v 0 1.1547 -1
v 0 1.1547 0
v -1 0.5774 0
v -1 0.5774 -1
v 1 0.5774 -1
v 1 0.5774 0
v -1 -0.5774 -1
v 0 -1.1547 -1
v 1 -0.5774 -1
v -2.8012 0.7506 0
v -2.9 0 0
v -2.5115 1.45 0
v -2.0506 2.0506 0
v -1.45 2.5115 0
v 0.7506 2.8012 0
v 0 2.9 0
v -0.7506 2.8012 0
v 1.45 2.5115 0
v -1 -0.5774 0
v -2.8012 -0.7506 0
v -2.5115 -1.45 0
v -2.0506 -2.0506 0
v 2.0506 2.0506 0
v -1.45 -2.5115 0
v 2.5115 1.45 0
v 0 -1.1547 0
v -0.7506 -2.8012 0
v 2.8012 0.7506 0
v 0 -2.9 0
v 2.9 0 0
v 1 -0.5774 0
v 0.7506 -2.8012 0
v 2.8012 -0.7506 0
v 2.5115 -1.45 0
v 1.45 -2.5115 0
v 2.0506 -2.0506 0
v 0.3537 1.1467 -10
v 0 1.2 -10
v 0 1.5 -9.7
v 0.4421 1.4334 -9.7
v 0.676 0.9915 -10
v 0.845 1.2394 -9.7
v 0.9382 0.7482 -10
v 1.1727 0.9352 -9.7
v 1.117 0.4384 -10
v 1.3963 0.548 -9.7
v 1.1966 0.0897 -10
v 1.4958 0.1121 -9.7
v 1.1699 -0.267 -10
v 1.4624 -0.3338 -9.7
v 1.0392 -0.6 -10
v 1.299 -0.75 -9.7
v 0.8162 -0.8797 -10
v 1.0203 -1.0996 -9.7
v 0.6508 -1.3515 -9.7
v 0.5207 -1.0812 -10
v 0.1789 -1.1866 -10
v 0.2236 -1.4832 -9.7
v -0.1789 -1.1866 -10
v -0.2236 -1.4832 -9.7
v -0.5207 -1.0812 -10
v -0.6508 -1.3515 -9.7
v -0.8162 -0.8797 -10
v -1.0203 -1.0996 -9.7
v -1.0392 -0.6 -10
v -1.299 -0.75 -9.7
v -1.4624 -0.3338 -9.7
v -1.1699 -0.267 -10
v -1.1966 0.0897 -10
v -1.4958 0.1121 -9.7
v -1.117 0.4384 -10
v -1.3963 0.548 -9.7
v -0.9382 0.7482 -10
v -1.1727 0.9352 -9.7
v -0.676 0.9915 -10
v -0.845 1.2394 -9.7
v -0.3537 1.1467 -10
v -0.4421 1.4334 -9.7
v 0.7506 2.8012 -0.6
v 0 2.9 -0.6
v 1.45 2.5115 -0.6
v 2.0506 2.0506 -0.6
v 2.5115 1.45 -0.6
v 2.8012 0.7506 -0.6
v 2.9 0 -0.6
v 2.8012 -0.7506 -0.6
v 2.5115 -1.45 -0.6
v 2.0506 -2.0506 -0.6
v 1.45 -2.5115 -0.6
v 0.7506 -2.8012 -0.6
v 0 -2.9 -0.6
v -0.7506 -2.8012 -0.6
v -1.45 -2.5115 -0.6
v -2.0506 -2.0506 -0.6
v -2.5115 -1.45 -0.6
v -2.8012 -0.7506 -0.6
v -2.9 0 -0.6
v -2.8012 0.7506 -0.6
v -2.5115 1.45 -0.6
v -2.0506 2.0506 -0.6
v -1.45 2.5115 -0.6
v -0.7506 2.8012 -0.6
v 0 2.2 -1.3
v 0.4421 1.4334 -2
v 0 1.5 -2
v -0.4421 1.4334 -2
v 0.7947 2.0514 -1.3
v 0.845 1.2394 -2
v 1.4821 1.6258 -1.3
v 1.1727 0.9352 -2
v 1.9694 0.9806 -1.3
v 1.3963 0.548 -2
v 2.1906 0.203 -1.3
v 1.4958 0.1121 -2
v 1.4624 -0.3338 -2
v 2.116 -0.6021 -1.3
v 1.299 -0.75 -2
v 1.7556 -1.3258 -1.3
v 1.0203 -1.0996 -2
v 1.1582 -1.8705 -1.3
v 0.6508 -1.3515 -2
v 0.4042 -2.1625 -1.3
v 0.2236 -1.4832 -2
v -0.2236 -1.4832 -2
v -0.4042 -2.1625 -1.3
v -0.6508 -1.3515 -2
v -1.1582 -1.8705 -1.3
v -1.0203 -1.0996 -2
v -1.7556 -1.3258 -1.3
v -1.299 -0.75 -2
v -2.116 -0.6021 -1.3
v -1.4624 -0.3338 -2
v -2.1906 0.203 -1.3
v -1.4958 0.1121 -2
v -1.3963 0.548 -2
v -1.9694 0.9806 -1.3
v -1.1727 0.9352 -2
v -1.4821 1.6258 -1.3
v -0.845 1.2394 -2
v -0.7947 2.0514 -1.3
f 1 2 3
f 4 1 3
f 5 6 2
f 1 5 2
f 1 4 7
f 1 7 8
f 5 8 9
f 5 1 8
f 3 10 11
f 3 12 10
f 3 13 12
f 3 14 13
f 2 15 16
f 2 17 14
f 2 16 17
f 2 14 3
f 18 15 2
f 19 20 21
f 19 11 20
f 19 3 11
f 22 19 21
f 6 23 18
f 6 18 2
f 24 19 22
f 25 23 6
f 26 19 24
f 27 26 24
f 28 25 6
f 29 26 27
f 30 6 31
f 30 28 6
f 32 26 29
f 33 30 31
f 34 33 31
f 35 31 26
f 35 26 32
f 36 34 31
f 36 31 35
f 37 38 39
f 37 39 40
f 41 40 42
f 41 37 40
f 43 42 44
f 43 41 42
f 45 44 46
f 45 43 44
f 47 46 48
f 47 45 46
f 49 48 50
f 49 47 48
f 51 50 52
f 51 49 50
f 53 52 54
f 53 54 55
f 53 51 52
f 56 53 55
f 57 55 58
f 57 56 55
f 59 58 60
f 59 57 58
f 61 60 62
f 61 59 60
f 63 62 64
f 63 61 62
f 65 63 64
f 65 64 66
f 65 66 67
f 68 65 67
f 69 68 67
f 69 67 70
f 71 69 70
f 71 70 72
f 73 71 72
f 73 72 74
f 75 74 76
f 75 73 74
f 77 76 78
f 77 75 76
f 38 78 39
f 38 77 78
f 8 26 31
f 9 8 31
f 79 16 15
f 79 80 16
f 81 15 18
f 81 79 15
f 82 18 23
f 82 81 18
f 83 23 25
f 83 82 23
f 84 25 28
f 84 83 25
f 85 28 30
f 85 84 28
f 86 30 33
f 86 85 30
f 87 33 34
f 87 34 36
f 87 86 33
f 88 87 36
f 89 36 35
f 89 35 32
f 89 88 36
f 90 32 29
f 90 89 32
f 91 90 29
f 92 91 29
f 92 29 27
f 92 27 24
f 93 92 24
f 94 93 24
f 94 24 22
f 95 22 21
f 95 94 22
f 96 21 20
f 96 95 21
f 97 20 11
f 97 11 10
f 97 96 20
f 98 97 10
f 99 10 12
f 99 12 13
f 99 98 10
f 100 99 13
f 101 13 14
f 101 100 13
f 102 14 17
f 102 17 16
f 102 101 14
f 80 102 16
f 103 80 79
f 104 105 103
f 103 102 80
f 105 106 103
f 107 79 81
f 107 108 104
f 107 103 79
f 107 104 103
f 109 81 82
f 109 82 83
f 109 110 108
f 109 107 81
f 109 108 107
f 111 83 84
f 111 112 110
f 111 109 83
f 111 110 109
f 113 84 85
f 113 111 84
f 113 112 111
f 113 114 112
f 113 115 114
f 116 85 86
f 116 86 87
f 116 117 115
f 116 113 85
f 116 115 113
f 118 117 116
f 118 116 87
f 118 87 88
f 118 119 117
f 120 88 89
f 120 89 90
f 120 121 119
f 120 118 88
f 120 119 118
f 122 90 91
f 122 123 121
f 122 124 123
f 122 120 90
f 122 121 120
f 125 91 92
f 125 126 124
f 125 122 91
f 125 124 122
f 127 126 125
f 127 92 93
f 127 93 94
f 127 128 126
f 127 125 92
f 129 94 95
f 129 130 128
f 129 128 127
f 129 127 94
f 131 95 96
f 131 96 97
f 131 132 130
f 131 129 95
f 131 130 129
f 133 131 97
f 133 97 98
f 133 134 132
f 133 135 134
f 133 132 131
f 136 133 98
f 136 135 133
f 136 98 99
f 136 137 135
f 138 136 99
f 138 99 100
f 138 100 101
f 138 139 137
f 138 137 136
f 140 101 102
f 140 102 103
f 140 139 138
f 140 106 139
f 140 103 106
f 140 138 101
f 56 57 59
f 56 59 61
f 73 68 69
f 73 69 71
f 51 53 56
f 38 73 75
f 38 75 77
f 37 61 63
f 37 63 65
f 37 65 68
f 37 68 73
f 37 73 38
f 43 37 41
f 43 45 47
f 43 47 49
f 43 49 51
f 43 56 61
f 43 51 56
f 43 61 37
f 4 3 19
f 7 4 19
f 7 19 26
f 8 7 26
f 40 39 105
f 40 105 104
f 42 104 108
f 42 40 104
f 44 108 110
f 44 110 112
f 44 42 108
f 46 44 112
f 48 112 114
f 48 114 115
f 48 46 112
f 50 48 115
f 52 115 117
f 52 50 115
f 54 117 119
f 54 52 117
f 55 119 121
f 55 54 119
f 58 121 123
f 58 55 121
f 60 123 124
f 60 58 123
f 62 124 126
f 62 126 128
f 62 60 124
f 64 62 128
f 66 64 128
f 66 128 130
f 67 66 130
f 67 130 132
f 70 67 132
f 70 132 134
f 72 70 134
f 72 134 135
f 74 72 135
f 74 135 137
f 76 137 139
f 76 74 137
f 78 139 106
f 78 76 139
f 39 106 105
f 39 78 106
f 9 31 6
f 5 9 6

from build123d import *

# Parameters (mm, degrees)
SCHNITT_LINEAR_AUSTRAGEN1_DEPTH = 1
FASE1_SIZE                      = 0.3


with BuildPart() as part:
    # Skizze1 → Rotation1 (revolve)
    with BuildSketch(Plane(origin=(0, 0, 0), x_dir=(0, 0, -1), z_dir=(1, 0, 0))):
        Polygon((0, 0), (0, 2.9), (0.6, 2.9), (2, 1.5), (10, 1.5), (10, 0), align=None)
    revolve(axis=Axis((0, 0, 31.763581507), (0, 0, -1)))

    # Skizze3 → Schnitt-Linear austragen1 (cut)
    with BuildSketch(Plane.XY):
        Polygon((1, -0.577350269), (1, 0.577350269), (0, 1.154700538), (-1, 0.577350269), (-1, -0.577350269), (0, -1.154700538), align=None)
    extrude(amount=-SCHNITT_LINEAR_AUSTRAGEN1_DEPTH, mode=Mode.SUBTRACT)

    # Fase1
    fase1_edges = [part.edges().sort_by_distance(p)[0] for p in [
        (0, -1.5, -10),
    ]]
    chamfer(fase1_edges, length=FASE1_SIZE)


solid = part.part
